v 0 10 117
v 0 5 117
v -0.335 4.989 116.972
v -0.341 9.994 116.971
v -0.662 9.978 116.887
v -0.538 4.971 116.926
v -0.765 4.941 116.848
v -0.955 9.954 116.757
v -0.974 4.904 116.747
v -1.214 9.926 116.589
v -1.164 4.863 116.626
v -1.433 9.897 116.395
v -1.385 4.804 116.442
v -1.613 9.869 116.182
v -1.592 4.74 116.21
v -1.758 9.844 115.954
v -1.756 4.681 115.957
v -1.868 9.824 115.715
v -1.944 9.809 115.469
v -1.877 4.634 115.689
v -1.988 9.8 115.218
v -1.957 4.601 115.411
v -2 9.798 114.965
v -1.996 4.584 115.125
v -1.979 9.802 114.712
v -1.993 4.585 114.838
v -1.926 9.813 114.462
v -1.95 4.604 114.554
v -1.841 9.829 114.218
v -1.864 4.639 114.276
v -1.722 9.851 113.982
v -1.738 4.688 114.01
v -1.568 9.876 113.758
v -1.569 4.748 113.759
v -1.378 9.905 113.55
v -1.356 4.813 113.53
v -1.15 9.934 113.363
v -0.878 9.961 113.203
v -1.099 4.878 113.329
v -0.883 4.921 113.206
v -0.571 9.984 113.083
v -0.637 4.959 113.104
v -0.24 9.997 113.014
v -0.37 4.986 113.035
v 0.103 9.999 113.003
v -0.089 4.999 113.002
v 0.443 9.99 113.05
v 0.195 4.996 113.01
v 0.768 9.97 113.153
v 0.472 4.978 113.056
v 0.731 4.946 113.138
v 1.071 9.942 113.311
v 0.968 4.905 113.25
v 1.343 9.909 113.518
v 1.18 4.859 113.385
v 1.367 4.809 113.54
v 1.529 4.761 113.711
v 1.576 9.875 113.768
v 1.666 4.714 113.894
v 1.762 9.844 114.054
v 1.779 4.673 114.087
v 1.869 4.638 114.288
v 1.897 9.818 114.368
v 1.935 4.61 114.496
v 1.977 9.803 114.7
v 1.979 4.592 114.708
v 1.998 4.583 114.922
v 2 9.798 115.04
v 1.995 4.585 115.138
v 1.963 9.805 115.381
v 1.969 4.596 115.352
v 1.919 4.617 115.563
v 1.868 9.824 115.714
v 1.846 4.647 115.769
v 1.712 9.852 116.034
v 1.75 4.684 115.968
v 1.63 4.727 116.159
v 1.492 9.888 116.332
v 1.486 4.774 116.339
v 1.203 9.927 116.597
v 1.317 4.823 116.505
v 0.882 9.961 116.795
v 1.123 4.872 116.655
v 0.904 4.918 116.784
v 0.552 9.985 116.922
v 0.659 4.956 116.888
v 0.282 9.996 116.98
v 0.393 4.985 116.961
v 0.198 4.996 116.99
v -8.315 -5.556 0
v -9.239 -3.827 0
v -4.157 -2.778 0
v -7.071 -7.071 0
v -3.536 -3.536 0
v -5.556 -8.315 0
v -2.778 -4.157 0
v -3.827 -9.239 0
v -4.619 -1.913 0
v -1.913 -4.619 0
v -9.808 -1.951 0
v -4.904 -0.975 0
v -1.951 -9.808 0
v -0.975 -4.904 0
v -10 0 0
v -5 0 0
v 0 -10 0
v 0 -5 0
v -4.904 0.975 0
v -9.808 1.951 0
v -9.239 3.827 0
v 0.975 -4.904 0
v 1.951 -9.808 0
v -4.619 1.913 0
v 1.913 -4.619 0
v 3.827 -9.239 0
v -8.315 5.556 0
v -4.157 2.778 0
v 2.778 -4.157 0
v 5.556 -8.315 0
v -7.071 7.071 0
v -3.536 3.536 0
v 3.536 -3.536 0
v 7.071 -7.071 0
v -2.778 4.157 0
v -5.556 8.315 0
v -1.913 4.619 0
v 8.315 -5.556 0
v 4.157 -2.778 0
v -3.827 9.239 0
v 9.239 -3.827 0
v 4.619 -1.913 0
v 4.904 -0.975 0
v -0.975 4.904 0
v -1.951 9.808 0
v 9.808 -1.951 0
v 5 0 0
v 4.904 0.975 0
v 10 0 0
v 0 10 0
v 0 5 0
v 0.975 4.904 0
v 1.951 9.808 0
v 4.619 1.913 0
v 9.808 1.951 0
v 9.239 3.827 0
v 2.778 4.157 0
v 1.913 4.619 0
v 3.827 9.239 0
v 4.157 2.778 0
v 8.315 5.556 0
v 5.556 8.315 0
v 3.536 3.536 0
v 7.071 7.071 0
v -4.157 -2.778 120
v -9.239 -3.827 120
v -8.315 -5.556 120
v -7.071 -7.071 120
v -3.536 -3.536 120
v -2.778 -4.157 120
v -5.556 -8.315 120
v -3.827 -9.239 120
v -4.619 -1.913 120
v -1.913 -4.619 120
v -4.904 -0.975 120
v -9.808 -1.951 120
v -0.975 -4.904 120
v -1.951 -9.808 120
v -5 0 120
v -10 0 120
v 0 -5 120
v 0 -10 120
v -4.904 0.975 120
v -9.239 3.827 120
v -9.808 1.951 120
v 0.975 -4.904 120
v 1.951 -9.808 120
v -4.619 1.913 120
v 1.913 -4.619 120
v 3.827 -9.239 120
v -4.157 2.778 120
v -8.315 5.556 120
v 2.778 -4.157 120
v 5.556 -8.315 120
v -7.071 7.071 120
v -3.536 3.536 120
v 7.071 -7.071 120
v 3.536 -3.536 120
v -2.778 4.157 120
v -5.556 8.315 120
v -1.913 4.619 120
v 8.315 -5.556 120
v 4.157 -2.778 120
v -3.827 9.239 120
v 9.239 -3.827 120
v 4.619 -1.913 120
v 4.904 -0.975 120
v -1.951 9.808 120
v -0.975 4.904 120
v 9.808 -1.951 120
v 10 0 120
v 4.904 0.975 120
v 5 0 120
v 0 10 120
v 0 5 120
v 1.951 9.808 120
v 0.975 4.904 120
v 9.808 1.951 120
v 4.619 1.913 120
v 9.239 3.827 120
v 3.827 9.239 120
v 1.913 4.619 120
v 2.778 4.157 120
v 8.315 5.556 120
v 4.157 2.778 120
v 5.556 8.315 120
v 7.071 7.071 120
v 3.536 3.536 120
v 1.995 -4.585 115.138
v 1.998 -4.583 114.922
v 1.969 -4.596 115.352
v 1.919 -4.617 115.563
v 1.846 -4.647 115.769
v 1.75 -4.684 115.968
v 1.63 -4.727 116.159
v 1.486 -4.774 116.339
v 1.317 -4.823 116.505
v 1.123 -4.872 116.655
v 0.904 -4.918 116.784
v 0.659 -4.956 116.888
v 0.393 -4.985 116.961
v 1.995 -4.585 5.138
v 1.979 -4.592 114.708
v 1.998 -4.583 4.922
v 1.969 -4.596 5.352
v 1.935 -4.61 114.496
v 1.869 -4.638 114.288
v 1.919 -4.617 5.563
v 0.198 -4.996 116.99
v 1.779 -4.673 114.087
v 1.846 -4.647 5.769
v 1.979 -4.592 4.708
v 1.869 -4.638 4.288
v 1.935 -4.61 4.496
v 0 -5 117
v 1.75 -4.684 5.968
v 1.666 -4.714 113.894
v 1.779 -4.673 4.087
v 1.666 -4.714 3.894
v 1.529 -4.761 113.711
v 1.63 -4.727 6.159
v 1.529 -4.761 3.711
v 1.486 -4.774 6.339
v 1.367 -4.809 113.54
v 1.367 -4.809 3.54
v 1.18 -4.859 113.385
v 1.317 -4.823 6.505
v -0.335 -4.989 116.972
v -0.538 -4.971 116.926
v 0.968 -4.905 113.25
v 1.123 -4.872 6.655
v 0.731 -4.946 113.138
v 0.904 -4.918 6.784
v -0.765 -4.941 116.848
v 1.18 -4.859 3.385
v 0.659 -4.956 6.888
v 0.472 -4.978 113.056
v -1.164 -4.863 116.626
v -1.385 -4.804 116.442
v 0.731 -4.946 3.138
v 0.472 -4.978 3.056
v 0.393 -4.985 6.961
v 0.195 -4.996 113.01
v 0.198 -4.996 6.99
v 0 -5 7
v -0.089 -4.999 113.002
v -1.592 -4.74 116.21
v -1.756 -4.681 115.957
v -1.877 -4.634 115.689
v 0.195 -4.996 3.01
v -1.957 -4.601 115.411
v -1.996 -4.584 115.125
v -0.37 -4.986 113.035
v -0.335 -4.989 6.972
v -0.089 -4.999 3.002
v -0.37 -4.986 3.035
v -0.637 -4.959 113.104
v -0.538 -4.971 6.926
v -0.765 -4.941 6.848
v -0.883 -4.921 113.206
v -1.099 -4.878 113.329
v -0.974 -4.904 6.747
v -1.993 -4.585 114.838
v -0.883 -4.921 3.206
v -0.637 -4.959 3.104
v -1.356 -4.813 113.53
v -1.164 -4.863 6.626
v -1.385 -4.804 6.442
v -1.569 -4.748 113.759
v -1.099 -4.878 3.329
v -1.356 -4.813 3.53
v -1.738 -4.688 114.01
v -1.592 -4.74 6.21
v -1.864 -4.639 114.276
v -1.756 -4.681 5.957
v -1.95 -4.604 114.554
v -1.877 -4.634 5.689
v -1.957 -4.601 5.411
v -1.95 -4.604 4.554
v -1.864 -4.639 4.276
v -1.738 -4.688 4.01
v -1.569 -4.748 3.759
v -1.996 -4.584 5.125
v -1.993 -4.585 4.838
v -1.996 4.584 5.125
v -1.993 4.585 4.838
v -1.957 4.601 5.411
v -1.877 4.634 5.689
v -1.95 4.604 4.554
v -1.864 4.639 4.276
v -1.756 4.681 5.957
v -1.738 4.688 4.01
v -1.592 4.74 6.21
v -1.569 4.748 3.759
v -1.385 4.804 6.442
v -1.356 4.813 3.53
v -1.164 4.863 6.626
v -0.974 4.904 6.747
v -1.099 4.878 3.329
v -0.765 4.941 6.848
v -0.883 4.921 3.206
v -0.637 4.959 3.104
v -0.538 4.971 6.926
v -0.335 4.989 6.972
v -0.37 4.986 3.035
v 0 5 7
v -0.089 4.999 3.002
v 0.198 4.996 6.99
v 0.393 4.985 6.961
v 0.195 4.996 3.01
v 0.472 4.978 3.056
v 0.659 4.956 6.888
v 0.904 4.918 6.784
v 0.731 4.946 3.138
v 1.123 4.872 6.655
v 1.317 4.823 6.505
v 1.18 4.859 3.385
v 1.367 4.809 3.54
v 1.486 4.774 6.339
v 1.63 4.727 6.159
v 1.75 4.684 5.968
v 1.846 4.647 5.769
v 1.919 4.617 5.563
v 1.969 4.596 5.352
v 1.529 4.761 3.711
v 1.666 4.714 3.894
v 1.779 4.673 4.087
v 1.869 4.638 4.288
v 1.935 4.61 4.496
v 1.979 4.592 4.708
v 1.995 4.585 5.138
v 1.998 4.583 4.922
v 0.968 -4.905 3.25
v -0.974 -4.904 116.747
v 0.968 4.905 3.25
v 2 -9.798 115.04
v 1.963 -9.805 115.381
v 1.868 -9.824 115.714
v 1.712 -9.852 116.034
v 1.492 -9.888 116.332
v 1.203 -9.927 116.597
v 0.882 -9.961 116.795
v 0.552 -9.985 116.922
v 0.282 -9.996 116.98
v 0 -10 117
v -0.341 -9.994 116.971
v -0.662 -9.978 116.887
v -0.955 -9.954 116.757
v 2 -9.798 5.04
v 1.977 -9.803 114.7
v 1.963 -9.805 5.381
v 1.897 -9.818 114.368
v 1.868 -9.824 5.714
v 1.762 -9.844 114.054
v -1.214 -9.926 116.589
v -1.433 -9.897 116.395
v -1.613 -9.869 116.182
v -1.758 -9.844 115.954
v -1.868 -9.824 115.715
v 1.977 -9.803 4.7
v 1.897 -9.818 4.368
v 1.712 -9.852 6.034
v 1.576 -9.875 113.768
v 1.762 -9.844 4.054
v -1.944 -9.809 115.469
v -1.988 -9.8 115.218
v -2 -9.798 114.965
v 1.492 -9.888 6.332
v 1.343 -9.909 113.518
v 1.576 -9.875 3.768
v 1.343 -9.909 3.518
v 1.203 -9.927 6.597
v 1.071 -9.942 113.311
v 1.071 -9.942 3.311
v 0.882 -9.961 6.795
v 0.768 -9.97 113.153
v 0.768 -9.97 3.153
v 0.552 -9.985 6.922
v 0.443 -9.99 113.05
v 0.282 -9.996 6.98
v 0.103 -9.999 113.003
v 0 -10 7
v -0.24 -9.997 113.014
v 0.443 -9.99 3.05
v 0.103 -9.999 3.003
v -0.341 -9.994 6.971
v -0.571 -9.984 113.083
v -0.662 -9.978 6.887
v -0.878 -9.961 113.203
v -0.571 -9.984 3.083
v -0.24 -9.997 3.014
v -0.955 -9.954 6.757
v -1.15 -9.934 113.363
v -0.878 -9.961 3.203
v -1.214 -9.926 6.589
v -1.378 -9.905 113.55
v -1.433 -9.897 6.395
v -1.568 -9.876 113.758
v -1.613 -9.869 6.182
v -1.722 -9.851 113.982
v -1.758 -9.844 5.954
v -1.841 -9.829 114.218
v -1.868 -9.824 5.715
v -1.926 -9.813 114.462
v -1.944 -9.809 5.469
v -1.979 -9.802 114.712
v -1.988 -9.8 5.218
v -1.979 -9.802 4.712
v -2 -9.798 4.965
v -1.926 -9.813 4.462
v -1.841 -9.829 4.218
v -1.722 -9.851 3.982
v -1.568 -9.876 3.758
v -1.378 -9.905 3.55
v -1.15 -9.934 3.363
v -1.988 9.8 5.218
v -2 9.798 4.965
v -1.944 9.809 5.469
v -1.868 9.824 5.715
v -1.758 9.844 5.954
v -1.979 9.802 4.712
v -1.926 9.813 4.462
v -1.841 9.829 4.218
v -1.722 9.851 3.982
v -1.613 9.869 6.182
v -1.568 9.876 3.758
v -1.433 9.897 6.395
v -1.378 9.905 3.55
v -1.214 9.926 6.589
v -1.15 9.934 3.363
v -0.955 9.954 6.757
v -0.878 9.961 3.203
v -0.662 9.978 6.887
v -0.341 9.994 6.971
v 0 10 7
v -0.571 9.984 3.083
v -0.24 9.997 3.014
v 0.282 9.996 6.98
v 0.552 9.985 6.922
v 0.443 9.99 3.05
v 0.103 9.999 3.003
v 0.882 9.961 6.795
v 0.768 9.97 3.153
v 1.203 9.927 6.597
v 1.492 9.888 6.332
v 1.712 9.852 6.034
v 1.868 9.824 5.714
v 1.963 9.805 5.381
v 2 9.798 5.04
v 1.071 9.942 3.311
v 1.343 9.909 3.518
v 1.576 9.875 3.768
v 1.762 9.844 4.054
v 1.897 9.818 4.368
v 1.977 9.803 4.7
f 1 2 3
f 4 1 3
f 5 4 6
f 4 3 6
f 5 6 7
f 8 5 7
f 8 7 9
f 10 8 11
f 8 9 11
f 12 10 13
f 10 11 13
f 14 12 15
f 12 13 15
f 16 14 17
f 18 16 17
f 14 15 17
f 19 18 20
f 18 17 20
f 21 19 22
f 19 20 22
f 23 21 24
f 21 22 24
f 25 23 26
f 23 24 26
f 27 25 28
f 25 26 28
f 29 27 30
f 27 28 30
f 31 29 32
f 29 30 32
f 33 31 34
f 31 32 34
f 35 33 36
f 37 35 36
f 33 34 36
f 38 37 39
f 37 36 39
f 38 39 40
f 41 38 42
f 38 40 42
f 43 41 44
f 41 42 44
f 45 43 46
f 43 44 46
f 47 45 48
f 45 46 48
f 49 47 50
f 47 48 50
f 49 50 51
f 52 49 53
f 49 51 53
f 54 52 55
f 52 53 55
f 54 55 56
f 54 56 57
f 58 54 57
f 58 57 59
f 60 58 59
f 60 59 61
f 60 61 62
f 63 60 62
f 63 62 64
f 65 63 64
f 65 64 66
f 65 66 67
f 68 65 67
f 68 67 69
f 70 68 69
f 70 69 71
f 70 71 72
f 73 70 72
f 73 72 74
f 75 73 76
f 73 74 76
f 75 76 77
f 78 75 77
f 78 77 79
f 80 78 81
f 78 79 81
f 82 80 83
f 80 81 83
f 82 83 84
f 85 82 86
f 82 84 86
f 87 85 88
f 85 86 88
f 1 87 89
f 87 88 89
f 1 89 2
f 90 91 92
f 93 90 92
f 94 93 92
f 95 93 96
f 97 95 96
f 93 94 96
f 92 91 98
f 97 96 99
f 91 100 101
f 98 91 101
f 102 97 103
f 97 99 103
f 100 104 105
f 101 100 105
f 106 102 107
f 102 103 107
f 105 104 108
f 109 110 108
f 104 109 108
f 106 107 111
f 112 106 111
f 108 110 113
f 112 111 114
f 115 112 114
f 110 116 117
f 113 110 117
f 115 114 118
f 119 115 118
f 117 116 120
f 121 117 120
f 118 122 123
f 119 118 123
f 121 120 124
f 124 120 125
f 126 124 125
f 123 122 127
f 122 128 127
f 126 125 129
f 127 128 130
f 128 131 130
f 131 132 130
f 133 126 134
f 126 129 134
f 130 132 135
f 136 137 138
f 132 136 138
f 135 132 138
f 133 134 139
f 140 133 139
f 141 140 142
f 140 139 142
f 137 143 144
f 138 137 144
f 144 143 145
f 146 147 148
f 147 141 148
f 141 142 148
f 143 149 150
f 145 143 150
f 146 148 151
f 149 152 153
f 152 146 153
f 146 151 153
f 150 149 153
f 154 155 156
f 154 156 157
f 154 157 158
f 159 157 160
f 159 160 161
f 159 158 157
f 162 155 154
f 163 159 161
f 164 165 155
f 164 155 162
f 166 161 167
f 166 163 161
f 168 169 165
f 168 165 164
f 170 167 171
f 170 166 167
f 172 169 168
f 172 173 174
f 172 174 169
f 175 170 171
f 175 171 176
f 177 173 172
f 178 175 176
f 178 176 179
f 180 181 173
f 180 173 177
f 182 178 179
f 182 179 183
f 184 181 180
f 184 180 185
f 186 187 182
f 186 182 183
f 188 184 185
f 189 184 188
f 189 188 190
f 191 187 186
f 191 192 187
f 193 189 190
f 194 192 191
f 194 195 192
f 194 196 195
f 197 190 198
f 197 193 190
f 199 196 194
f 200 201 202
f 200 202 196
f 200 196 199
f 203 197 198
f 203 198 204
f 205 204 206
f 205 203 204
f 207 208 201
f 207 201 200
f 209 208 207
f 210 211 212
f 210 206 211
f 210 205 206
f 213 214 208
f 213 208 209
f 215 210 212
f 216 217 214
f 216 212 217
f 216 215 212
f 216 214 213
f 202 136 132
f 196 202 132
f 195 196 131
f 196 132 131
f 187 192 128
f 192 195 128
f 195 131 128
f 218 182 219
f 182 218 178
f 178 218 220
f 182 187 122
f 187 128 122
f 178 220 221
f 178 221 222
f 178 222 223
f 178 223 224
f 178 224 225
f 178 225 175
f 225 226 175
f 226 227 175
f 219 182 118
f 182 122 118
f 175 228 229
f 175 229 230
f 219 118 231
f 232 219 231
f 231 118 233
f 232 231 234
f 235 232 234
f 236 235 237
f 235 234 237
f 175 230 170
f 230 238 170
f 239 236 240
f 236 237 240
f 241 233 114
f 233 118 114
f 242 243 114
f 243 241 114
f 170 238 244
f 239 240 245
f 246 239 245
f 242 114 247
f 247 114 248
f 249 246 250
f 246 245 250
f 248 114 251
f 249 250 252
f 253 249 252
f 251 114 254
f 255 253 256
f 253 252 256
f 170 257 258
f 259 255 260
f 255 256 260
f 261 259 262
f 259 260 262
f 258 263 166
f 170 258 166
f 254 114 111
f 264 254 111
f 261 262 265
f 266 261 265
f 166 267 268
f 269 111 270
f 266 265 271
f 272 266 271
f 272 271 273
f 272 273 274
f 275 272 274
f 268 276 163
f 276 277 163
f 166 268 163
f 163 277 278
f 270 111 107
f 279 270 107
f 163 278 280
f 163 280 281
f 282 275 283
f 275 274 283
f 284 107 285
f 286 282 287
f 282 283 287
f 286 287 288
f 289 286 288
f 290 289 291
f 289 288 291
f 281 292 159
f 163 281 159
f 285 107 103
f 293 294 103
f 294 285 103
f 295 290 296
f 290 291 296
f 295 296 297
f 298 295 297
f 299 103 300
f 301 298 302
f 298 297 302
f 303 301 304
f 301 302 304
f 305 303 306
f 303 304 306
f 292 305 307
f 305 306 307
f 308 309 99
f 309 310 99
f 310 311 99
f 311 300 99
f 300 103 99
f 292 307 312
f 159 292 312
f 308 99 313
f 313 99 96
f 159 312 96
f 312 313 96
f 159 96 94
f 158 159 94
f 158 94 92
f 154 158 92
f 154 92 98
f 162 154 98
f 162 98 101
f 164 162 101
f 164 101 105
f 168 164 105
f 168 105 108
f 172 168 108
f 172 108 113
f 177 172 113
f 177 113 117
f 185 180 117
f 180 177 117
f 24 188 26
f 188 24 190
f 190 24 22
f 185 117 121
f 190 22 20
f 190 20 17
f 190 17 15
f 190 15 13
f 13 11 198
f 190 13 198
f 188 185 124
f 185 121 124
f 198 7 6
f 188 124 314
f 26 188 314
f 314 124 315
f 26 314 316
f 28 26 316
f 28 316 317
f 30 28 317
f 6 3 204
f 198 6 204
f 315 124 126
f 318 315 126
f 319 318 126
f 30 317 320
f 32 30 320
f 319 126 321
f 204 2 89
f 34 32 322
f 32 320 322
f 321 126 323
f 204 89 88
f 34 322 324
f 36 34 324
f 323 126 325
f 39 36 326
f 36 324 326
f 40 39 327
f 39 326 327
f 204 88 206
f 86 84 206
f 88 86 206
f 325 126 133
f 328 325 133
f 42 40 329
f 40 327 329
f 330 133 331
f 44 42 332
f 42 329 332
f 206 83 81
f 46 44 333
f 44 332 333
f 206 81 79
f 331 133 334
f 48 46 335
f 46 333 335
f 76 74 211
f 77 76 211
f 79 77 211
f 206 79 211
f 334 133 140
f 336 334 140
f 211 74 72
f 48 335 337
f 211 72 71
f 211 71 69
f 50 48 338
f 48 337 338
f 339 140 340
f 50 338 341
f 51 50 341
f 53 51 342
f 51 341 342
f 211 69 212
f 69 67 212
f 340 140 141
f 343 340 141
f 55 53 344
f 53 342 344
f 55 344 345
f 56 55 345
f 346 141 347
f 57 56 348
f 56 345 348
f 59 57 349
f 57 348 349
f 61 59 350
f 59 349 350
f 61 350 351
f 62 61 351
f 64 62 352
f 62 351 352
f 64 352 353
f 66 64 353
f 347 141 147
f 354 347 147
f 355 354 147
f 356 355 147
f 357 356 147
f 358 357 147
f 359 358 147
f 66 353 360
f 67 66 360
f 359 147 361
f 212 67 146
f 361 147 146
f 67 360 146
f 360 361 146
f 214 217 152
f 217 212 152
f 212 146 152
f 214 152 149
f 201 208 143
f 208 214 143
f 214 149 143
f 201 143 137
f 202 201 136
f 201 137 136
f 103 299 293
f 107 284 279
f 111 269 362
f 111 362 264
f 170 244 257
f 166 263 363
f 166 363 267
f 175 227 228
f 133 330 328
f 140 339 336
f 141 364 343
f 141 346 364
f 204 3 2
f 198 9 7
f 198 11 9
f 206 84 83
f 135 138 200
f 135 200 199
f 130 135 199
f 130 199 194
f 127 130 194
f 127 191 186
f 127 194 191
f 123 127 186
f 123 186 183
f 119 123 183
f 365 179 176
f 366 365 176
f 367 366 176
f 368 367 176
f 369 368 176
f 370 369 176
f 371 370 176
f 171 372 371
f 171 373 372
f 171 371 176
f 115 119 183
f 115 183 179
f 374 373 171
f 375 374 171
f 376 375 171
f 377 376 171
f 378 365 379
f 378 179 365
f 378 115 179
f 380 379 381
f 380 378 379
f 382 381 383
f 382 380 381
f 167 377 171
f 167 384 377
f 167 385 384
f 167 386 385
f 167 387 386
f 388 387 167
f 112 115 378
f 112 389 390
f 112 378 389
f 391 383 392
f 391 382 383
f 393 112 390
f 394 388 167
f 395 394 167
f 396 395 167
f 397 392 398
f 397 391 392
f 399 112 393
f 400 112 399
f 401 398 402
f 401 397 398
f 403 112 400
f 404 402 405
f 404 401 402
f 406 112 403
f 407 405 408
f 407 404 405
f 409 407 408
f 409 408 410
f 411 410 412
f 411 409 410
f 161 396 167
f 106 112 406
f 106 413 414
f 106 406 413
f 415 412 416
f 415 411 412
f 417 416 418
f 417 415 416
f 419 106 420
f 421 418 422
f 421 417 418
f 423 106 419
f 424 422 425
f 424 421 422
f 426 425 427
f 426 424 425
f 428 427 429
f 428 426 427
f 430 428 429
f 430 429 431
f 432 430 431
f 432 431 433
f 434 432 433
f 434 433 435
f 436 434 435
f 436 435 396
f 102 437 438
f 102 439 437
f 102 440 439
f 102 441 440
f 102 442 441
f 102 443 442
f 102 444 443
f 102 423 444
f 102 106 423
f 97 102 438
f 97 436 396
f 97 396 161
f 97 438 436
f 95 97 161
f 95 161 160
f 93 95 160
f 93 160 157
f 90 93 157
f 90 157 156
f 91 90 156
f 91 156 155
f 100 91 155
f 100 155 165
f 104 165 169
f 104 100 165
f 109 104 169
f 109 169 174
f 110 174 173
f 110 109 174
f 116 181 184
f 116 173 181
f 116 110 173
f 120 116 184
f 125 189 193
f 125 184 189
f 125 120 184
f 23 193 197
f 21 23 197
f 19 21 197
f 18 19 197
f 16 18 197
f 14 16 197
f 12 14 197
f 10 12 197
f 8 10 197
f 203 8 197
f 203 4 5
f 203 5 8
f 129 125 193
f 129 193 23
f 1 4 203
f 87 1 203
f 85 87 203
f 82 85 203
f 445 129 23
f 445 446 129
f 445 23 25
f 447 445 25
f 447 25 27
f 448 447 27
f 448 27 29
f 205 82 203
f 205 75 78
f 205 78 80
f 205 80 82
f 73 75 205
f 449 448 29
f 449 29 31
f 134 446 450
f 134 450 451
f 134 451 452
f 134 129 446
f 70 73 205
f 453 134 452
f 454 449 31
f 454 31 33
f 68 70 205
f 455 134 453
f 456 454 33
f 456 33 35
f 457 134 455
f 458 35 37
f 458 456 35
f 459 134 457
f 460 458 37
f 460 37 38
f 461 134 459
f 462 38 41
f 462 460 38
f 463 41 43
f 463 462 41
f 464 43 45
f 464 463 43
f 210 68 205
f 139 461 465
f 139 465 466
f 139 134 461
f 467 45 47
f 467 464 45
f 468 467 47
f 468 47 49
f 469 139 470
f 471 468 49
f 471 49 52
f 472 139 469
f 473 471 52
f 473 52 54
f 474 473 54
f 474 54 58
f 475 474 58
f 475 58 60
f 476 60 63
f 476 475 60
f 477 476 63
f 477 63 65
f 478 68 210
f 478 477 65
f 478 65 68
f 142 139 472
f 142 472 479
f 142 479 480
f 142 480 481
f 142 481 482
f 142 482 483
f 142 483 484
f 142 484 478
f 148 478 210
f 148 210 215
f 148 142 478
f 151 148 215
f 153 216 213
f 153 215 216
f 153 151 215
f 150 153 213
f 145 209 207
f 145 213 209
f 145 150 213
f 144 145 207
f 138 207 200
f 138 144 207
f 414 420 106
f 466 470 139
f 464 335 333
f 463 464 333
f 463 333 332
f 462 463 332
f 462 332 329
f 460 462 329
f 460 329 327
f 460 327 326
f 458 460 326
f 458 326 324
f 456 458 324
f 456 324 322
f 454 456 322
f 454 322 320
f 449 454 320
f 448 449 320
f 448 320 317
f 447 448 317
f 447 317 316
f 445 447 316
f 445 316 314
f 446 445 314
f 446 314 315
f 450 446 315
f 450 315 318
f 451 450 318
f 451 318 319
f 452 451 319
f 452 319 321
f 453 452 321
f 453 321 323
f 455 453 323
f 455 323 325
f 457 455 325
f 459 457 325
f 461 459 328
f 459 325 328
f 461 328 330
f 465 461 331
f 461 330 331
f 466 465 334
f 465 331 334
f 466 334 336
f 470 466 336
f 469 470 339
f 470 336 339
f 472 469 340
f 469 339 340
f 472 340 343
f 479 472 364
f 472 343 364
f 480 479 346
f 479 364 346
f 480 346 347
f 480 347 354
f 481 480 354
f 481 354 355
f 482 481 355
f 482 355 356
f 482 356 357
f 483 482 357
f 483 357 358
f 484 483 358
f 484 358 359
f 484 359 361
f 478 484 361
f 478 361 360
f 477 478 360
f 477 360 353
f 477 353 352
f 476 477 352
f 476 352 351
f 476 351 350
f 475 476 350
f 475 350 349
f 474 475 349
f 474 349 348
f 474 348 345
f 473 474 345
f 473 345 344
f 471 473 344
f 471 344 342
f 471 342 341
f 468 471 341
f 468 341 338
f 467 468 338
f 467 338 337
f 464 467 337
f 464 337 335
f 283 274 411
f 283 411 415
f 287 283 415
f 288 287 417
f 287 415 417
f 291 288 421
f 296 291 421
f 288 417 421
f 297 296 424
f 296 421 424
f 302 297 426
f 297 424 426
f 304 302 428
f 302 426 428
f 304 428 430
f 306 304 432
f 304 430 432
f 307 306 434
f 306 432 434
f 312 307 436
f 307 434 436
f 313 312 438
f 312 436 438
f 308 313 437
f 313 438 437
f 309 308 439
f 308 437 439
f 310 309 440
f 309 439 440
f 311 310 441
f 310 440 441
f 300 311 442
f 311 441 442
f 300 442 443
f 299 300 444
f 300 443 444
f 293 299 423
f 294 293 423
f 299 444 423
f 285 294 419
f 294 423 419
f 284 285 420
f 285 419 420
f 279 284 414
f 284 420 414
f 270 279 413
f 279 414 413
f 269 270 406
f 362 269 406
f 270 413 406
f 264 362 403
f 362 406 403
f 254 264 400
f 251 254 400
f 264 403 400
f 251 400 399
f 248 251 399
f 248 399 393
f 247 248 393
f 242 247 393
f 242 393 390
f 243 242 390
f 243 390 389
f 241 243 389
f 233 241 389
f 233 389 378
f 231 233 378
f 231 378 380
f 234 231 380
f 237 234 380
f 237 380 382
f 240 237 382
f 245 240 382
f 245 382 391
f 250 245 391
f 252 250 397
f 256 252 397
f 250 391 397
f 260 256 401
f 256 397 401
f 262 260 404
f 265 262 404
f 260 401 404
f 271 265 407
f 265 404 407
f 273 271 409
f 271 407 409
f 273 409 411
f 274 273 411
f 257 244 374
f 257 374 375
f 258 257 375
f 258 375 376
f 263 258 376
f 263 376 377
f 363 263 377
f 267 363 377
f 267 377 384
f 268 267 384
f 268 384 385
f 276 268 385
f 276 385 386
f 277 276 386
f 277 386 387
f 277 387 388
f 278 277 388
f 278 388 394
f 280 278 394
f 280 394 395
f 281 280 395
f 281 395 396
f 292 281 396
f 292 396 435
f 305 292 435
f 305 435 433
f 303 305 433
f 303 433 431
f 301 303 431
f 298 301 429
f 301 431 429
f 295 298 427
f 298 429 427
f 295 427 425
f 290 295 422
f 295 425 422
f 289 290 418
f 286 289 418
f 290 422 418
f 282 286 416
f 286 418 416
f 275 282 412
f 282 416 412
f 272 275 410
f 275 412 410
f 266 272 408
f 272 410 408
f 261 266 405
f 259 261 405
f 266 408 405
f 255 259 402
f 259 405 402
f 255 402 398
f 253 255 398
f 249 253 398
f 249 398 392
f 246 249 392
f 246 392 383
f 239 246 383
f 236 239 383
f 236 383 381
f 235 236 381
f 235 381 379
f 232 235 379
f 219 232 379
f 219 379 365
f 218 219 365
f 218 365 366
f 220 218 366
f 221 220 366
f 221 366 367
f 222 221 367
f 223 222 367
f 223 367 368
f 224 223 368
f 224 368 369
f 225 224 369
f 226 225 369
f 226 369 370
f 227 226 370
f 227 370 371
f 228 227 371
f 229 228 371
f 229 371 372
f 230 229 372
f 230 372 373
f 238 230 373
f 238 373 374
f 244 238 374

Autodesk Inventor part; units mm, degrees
ref_plane "YZ Plane" through (0, 0, 0) normal (1, 0, 0) x (0, 1, 0)
ref_plane "XZ Plane" through (0, 0, 0) normal (0, 1, 0) x (-1, 0, 0)
ref_plane "XY Plane" through (0, 0, 0) normal (0, 0, 1) x (1, 0, 0)
sketch "Esquisse1" plane through (0, 0, 0) normal (0, 0, 1) x (1, 0, 0)
  circle A0 centre (0, 0) radius 10
  circle A1 centre (0, 0) radius 5
  dimension "d0" = 20
  dimension "d1" = 10
extrude "Extrusion1" add sketch "Esquisse1" along normal blind 120
sketch "Esquisse2" plane through (0, 0, 0) normal (0, 1, 0) x (-1, 0, 0)
  line L0 (0, 0) -> (0, 5)
  line L1 (10, 120) -> (-10, 120) projected
  line L2 (0, 120) -> (0, 115)
  dimension "d4" = 5
  dimension "d5" = 5
hole "Perçage1" at (0, 0, 5) at (0, 0, 115) direction (0, -1, 0) diameter 4 end through all both
properties part number "tubelong_rocker"
